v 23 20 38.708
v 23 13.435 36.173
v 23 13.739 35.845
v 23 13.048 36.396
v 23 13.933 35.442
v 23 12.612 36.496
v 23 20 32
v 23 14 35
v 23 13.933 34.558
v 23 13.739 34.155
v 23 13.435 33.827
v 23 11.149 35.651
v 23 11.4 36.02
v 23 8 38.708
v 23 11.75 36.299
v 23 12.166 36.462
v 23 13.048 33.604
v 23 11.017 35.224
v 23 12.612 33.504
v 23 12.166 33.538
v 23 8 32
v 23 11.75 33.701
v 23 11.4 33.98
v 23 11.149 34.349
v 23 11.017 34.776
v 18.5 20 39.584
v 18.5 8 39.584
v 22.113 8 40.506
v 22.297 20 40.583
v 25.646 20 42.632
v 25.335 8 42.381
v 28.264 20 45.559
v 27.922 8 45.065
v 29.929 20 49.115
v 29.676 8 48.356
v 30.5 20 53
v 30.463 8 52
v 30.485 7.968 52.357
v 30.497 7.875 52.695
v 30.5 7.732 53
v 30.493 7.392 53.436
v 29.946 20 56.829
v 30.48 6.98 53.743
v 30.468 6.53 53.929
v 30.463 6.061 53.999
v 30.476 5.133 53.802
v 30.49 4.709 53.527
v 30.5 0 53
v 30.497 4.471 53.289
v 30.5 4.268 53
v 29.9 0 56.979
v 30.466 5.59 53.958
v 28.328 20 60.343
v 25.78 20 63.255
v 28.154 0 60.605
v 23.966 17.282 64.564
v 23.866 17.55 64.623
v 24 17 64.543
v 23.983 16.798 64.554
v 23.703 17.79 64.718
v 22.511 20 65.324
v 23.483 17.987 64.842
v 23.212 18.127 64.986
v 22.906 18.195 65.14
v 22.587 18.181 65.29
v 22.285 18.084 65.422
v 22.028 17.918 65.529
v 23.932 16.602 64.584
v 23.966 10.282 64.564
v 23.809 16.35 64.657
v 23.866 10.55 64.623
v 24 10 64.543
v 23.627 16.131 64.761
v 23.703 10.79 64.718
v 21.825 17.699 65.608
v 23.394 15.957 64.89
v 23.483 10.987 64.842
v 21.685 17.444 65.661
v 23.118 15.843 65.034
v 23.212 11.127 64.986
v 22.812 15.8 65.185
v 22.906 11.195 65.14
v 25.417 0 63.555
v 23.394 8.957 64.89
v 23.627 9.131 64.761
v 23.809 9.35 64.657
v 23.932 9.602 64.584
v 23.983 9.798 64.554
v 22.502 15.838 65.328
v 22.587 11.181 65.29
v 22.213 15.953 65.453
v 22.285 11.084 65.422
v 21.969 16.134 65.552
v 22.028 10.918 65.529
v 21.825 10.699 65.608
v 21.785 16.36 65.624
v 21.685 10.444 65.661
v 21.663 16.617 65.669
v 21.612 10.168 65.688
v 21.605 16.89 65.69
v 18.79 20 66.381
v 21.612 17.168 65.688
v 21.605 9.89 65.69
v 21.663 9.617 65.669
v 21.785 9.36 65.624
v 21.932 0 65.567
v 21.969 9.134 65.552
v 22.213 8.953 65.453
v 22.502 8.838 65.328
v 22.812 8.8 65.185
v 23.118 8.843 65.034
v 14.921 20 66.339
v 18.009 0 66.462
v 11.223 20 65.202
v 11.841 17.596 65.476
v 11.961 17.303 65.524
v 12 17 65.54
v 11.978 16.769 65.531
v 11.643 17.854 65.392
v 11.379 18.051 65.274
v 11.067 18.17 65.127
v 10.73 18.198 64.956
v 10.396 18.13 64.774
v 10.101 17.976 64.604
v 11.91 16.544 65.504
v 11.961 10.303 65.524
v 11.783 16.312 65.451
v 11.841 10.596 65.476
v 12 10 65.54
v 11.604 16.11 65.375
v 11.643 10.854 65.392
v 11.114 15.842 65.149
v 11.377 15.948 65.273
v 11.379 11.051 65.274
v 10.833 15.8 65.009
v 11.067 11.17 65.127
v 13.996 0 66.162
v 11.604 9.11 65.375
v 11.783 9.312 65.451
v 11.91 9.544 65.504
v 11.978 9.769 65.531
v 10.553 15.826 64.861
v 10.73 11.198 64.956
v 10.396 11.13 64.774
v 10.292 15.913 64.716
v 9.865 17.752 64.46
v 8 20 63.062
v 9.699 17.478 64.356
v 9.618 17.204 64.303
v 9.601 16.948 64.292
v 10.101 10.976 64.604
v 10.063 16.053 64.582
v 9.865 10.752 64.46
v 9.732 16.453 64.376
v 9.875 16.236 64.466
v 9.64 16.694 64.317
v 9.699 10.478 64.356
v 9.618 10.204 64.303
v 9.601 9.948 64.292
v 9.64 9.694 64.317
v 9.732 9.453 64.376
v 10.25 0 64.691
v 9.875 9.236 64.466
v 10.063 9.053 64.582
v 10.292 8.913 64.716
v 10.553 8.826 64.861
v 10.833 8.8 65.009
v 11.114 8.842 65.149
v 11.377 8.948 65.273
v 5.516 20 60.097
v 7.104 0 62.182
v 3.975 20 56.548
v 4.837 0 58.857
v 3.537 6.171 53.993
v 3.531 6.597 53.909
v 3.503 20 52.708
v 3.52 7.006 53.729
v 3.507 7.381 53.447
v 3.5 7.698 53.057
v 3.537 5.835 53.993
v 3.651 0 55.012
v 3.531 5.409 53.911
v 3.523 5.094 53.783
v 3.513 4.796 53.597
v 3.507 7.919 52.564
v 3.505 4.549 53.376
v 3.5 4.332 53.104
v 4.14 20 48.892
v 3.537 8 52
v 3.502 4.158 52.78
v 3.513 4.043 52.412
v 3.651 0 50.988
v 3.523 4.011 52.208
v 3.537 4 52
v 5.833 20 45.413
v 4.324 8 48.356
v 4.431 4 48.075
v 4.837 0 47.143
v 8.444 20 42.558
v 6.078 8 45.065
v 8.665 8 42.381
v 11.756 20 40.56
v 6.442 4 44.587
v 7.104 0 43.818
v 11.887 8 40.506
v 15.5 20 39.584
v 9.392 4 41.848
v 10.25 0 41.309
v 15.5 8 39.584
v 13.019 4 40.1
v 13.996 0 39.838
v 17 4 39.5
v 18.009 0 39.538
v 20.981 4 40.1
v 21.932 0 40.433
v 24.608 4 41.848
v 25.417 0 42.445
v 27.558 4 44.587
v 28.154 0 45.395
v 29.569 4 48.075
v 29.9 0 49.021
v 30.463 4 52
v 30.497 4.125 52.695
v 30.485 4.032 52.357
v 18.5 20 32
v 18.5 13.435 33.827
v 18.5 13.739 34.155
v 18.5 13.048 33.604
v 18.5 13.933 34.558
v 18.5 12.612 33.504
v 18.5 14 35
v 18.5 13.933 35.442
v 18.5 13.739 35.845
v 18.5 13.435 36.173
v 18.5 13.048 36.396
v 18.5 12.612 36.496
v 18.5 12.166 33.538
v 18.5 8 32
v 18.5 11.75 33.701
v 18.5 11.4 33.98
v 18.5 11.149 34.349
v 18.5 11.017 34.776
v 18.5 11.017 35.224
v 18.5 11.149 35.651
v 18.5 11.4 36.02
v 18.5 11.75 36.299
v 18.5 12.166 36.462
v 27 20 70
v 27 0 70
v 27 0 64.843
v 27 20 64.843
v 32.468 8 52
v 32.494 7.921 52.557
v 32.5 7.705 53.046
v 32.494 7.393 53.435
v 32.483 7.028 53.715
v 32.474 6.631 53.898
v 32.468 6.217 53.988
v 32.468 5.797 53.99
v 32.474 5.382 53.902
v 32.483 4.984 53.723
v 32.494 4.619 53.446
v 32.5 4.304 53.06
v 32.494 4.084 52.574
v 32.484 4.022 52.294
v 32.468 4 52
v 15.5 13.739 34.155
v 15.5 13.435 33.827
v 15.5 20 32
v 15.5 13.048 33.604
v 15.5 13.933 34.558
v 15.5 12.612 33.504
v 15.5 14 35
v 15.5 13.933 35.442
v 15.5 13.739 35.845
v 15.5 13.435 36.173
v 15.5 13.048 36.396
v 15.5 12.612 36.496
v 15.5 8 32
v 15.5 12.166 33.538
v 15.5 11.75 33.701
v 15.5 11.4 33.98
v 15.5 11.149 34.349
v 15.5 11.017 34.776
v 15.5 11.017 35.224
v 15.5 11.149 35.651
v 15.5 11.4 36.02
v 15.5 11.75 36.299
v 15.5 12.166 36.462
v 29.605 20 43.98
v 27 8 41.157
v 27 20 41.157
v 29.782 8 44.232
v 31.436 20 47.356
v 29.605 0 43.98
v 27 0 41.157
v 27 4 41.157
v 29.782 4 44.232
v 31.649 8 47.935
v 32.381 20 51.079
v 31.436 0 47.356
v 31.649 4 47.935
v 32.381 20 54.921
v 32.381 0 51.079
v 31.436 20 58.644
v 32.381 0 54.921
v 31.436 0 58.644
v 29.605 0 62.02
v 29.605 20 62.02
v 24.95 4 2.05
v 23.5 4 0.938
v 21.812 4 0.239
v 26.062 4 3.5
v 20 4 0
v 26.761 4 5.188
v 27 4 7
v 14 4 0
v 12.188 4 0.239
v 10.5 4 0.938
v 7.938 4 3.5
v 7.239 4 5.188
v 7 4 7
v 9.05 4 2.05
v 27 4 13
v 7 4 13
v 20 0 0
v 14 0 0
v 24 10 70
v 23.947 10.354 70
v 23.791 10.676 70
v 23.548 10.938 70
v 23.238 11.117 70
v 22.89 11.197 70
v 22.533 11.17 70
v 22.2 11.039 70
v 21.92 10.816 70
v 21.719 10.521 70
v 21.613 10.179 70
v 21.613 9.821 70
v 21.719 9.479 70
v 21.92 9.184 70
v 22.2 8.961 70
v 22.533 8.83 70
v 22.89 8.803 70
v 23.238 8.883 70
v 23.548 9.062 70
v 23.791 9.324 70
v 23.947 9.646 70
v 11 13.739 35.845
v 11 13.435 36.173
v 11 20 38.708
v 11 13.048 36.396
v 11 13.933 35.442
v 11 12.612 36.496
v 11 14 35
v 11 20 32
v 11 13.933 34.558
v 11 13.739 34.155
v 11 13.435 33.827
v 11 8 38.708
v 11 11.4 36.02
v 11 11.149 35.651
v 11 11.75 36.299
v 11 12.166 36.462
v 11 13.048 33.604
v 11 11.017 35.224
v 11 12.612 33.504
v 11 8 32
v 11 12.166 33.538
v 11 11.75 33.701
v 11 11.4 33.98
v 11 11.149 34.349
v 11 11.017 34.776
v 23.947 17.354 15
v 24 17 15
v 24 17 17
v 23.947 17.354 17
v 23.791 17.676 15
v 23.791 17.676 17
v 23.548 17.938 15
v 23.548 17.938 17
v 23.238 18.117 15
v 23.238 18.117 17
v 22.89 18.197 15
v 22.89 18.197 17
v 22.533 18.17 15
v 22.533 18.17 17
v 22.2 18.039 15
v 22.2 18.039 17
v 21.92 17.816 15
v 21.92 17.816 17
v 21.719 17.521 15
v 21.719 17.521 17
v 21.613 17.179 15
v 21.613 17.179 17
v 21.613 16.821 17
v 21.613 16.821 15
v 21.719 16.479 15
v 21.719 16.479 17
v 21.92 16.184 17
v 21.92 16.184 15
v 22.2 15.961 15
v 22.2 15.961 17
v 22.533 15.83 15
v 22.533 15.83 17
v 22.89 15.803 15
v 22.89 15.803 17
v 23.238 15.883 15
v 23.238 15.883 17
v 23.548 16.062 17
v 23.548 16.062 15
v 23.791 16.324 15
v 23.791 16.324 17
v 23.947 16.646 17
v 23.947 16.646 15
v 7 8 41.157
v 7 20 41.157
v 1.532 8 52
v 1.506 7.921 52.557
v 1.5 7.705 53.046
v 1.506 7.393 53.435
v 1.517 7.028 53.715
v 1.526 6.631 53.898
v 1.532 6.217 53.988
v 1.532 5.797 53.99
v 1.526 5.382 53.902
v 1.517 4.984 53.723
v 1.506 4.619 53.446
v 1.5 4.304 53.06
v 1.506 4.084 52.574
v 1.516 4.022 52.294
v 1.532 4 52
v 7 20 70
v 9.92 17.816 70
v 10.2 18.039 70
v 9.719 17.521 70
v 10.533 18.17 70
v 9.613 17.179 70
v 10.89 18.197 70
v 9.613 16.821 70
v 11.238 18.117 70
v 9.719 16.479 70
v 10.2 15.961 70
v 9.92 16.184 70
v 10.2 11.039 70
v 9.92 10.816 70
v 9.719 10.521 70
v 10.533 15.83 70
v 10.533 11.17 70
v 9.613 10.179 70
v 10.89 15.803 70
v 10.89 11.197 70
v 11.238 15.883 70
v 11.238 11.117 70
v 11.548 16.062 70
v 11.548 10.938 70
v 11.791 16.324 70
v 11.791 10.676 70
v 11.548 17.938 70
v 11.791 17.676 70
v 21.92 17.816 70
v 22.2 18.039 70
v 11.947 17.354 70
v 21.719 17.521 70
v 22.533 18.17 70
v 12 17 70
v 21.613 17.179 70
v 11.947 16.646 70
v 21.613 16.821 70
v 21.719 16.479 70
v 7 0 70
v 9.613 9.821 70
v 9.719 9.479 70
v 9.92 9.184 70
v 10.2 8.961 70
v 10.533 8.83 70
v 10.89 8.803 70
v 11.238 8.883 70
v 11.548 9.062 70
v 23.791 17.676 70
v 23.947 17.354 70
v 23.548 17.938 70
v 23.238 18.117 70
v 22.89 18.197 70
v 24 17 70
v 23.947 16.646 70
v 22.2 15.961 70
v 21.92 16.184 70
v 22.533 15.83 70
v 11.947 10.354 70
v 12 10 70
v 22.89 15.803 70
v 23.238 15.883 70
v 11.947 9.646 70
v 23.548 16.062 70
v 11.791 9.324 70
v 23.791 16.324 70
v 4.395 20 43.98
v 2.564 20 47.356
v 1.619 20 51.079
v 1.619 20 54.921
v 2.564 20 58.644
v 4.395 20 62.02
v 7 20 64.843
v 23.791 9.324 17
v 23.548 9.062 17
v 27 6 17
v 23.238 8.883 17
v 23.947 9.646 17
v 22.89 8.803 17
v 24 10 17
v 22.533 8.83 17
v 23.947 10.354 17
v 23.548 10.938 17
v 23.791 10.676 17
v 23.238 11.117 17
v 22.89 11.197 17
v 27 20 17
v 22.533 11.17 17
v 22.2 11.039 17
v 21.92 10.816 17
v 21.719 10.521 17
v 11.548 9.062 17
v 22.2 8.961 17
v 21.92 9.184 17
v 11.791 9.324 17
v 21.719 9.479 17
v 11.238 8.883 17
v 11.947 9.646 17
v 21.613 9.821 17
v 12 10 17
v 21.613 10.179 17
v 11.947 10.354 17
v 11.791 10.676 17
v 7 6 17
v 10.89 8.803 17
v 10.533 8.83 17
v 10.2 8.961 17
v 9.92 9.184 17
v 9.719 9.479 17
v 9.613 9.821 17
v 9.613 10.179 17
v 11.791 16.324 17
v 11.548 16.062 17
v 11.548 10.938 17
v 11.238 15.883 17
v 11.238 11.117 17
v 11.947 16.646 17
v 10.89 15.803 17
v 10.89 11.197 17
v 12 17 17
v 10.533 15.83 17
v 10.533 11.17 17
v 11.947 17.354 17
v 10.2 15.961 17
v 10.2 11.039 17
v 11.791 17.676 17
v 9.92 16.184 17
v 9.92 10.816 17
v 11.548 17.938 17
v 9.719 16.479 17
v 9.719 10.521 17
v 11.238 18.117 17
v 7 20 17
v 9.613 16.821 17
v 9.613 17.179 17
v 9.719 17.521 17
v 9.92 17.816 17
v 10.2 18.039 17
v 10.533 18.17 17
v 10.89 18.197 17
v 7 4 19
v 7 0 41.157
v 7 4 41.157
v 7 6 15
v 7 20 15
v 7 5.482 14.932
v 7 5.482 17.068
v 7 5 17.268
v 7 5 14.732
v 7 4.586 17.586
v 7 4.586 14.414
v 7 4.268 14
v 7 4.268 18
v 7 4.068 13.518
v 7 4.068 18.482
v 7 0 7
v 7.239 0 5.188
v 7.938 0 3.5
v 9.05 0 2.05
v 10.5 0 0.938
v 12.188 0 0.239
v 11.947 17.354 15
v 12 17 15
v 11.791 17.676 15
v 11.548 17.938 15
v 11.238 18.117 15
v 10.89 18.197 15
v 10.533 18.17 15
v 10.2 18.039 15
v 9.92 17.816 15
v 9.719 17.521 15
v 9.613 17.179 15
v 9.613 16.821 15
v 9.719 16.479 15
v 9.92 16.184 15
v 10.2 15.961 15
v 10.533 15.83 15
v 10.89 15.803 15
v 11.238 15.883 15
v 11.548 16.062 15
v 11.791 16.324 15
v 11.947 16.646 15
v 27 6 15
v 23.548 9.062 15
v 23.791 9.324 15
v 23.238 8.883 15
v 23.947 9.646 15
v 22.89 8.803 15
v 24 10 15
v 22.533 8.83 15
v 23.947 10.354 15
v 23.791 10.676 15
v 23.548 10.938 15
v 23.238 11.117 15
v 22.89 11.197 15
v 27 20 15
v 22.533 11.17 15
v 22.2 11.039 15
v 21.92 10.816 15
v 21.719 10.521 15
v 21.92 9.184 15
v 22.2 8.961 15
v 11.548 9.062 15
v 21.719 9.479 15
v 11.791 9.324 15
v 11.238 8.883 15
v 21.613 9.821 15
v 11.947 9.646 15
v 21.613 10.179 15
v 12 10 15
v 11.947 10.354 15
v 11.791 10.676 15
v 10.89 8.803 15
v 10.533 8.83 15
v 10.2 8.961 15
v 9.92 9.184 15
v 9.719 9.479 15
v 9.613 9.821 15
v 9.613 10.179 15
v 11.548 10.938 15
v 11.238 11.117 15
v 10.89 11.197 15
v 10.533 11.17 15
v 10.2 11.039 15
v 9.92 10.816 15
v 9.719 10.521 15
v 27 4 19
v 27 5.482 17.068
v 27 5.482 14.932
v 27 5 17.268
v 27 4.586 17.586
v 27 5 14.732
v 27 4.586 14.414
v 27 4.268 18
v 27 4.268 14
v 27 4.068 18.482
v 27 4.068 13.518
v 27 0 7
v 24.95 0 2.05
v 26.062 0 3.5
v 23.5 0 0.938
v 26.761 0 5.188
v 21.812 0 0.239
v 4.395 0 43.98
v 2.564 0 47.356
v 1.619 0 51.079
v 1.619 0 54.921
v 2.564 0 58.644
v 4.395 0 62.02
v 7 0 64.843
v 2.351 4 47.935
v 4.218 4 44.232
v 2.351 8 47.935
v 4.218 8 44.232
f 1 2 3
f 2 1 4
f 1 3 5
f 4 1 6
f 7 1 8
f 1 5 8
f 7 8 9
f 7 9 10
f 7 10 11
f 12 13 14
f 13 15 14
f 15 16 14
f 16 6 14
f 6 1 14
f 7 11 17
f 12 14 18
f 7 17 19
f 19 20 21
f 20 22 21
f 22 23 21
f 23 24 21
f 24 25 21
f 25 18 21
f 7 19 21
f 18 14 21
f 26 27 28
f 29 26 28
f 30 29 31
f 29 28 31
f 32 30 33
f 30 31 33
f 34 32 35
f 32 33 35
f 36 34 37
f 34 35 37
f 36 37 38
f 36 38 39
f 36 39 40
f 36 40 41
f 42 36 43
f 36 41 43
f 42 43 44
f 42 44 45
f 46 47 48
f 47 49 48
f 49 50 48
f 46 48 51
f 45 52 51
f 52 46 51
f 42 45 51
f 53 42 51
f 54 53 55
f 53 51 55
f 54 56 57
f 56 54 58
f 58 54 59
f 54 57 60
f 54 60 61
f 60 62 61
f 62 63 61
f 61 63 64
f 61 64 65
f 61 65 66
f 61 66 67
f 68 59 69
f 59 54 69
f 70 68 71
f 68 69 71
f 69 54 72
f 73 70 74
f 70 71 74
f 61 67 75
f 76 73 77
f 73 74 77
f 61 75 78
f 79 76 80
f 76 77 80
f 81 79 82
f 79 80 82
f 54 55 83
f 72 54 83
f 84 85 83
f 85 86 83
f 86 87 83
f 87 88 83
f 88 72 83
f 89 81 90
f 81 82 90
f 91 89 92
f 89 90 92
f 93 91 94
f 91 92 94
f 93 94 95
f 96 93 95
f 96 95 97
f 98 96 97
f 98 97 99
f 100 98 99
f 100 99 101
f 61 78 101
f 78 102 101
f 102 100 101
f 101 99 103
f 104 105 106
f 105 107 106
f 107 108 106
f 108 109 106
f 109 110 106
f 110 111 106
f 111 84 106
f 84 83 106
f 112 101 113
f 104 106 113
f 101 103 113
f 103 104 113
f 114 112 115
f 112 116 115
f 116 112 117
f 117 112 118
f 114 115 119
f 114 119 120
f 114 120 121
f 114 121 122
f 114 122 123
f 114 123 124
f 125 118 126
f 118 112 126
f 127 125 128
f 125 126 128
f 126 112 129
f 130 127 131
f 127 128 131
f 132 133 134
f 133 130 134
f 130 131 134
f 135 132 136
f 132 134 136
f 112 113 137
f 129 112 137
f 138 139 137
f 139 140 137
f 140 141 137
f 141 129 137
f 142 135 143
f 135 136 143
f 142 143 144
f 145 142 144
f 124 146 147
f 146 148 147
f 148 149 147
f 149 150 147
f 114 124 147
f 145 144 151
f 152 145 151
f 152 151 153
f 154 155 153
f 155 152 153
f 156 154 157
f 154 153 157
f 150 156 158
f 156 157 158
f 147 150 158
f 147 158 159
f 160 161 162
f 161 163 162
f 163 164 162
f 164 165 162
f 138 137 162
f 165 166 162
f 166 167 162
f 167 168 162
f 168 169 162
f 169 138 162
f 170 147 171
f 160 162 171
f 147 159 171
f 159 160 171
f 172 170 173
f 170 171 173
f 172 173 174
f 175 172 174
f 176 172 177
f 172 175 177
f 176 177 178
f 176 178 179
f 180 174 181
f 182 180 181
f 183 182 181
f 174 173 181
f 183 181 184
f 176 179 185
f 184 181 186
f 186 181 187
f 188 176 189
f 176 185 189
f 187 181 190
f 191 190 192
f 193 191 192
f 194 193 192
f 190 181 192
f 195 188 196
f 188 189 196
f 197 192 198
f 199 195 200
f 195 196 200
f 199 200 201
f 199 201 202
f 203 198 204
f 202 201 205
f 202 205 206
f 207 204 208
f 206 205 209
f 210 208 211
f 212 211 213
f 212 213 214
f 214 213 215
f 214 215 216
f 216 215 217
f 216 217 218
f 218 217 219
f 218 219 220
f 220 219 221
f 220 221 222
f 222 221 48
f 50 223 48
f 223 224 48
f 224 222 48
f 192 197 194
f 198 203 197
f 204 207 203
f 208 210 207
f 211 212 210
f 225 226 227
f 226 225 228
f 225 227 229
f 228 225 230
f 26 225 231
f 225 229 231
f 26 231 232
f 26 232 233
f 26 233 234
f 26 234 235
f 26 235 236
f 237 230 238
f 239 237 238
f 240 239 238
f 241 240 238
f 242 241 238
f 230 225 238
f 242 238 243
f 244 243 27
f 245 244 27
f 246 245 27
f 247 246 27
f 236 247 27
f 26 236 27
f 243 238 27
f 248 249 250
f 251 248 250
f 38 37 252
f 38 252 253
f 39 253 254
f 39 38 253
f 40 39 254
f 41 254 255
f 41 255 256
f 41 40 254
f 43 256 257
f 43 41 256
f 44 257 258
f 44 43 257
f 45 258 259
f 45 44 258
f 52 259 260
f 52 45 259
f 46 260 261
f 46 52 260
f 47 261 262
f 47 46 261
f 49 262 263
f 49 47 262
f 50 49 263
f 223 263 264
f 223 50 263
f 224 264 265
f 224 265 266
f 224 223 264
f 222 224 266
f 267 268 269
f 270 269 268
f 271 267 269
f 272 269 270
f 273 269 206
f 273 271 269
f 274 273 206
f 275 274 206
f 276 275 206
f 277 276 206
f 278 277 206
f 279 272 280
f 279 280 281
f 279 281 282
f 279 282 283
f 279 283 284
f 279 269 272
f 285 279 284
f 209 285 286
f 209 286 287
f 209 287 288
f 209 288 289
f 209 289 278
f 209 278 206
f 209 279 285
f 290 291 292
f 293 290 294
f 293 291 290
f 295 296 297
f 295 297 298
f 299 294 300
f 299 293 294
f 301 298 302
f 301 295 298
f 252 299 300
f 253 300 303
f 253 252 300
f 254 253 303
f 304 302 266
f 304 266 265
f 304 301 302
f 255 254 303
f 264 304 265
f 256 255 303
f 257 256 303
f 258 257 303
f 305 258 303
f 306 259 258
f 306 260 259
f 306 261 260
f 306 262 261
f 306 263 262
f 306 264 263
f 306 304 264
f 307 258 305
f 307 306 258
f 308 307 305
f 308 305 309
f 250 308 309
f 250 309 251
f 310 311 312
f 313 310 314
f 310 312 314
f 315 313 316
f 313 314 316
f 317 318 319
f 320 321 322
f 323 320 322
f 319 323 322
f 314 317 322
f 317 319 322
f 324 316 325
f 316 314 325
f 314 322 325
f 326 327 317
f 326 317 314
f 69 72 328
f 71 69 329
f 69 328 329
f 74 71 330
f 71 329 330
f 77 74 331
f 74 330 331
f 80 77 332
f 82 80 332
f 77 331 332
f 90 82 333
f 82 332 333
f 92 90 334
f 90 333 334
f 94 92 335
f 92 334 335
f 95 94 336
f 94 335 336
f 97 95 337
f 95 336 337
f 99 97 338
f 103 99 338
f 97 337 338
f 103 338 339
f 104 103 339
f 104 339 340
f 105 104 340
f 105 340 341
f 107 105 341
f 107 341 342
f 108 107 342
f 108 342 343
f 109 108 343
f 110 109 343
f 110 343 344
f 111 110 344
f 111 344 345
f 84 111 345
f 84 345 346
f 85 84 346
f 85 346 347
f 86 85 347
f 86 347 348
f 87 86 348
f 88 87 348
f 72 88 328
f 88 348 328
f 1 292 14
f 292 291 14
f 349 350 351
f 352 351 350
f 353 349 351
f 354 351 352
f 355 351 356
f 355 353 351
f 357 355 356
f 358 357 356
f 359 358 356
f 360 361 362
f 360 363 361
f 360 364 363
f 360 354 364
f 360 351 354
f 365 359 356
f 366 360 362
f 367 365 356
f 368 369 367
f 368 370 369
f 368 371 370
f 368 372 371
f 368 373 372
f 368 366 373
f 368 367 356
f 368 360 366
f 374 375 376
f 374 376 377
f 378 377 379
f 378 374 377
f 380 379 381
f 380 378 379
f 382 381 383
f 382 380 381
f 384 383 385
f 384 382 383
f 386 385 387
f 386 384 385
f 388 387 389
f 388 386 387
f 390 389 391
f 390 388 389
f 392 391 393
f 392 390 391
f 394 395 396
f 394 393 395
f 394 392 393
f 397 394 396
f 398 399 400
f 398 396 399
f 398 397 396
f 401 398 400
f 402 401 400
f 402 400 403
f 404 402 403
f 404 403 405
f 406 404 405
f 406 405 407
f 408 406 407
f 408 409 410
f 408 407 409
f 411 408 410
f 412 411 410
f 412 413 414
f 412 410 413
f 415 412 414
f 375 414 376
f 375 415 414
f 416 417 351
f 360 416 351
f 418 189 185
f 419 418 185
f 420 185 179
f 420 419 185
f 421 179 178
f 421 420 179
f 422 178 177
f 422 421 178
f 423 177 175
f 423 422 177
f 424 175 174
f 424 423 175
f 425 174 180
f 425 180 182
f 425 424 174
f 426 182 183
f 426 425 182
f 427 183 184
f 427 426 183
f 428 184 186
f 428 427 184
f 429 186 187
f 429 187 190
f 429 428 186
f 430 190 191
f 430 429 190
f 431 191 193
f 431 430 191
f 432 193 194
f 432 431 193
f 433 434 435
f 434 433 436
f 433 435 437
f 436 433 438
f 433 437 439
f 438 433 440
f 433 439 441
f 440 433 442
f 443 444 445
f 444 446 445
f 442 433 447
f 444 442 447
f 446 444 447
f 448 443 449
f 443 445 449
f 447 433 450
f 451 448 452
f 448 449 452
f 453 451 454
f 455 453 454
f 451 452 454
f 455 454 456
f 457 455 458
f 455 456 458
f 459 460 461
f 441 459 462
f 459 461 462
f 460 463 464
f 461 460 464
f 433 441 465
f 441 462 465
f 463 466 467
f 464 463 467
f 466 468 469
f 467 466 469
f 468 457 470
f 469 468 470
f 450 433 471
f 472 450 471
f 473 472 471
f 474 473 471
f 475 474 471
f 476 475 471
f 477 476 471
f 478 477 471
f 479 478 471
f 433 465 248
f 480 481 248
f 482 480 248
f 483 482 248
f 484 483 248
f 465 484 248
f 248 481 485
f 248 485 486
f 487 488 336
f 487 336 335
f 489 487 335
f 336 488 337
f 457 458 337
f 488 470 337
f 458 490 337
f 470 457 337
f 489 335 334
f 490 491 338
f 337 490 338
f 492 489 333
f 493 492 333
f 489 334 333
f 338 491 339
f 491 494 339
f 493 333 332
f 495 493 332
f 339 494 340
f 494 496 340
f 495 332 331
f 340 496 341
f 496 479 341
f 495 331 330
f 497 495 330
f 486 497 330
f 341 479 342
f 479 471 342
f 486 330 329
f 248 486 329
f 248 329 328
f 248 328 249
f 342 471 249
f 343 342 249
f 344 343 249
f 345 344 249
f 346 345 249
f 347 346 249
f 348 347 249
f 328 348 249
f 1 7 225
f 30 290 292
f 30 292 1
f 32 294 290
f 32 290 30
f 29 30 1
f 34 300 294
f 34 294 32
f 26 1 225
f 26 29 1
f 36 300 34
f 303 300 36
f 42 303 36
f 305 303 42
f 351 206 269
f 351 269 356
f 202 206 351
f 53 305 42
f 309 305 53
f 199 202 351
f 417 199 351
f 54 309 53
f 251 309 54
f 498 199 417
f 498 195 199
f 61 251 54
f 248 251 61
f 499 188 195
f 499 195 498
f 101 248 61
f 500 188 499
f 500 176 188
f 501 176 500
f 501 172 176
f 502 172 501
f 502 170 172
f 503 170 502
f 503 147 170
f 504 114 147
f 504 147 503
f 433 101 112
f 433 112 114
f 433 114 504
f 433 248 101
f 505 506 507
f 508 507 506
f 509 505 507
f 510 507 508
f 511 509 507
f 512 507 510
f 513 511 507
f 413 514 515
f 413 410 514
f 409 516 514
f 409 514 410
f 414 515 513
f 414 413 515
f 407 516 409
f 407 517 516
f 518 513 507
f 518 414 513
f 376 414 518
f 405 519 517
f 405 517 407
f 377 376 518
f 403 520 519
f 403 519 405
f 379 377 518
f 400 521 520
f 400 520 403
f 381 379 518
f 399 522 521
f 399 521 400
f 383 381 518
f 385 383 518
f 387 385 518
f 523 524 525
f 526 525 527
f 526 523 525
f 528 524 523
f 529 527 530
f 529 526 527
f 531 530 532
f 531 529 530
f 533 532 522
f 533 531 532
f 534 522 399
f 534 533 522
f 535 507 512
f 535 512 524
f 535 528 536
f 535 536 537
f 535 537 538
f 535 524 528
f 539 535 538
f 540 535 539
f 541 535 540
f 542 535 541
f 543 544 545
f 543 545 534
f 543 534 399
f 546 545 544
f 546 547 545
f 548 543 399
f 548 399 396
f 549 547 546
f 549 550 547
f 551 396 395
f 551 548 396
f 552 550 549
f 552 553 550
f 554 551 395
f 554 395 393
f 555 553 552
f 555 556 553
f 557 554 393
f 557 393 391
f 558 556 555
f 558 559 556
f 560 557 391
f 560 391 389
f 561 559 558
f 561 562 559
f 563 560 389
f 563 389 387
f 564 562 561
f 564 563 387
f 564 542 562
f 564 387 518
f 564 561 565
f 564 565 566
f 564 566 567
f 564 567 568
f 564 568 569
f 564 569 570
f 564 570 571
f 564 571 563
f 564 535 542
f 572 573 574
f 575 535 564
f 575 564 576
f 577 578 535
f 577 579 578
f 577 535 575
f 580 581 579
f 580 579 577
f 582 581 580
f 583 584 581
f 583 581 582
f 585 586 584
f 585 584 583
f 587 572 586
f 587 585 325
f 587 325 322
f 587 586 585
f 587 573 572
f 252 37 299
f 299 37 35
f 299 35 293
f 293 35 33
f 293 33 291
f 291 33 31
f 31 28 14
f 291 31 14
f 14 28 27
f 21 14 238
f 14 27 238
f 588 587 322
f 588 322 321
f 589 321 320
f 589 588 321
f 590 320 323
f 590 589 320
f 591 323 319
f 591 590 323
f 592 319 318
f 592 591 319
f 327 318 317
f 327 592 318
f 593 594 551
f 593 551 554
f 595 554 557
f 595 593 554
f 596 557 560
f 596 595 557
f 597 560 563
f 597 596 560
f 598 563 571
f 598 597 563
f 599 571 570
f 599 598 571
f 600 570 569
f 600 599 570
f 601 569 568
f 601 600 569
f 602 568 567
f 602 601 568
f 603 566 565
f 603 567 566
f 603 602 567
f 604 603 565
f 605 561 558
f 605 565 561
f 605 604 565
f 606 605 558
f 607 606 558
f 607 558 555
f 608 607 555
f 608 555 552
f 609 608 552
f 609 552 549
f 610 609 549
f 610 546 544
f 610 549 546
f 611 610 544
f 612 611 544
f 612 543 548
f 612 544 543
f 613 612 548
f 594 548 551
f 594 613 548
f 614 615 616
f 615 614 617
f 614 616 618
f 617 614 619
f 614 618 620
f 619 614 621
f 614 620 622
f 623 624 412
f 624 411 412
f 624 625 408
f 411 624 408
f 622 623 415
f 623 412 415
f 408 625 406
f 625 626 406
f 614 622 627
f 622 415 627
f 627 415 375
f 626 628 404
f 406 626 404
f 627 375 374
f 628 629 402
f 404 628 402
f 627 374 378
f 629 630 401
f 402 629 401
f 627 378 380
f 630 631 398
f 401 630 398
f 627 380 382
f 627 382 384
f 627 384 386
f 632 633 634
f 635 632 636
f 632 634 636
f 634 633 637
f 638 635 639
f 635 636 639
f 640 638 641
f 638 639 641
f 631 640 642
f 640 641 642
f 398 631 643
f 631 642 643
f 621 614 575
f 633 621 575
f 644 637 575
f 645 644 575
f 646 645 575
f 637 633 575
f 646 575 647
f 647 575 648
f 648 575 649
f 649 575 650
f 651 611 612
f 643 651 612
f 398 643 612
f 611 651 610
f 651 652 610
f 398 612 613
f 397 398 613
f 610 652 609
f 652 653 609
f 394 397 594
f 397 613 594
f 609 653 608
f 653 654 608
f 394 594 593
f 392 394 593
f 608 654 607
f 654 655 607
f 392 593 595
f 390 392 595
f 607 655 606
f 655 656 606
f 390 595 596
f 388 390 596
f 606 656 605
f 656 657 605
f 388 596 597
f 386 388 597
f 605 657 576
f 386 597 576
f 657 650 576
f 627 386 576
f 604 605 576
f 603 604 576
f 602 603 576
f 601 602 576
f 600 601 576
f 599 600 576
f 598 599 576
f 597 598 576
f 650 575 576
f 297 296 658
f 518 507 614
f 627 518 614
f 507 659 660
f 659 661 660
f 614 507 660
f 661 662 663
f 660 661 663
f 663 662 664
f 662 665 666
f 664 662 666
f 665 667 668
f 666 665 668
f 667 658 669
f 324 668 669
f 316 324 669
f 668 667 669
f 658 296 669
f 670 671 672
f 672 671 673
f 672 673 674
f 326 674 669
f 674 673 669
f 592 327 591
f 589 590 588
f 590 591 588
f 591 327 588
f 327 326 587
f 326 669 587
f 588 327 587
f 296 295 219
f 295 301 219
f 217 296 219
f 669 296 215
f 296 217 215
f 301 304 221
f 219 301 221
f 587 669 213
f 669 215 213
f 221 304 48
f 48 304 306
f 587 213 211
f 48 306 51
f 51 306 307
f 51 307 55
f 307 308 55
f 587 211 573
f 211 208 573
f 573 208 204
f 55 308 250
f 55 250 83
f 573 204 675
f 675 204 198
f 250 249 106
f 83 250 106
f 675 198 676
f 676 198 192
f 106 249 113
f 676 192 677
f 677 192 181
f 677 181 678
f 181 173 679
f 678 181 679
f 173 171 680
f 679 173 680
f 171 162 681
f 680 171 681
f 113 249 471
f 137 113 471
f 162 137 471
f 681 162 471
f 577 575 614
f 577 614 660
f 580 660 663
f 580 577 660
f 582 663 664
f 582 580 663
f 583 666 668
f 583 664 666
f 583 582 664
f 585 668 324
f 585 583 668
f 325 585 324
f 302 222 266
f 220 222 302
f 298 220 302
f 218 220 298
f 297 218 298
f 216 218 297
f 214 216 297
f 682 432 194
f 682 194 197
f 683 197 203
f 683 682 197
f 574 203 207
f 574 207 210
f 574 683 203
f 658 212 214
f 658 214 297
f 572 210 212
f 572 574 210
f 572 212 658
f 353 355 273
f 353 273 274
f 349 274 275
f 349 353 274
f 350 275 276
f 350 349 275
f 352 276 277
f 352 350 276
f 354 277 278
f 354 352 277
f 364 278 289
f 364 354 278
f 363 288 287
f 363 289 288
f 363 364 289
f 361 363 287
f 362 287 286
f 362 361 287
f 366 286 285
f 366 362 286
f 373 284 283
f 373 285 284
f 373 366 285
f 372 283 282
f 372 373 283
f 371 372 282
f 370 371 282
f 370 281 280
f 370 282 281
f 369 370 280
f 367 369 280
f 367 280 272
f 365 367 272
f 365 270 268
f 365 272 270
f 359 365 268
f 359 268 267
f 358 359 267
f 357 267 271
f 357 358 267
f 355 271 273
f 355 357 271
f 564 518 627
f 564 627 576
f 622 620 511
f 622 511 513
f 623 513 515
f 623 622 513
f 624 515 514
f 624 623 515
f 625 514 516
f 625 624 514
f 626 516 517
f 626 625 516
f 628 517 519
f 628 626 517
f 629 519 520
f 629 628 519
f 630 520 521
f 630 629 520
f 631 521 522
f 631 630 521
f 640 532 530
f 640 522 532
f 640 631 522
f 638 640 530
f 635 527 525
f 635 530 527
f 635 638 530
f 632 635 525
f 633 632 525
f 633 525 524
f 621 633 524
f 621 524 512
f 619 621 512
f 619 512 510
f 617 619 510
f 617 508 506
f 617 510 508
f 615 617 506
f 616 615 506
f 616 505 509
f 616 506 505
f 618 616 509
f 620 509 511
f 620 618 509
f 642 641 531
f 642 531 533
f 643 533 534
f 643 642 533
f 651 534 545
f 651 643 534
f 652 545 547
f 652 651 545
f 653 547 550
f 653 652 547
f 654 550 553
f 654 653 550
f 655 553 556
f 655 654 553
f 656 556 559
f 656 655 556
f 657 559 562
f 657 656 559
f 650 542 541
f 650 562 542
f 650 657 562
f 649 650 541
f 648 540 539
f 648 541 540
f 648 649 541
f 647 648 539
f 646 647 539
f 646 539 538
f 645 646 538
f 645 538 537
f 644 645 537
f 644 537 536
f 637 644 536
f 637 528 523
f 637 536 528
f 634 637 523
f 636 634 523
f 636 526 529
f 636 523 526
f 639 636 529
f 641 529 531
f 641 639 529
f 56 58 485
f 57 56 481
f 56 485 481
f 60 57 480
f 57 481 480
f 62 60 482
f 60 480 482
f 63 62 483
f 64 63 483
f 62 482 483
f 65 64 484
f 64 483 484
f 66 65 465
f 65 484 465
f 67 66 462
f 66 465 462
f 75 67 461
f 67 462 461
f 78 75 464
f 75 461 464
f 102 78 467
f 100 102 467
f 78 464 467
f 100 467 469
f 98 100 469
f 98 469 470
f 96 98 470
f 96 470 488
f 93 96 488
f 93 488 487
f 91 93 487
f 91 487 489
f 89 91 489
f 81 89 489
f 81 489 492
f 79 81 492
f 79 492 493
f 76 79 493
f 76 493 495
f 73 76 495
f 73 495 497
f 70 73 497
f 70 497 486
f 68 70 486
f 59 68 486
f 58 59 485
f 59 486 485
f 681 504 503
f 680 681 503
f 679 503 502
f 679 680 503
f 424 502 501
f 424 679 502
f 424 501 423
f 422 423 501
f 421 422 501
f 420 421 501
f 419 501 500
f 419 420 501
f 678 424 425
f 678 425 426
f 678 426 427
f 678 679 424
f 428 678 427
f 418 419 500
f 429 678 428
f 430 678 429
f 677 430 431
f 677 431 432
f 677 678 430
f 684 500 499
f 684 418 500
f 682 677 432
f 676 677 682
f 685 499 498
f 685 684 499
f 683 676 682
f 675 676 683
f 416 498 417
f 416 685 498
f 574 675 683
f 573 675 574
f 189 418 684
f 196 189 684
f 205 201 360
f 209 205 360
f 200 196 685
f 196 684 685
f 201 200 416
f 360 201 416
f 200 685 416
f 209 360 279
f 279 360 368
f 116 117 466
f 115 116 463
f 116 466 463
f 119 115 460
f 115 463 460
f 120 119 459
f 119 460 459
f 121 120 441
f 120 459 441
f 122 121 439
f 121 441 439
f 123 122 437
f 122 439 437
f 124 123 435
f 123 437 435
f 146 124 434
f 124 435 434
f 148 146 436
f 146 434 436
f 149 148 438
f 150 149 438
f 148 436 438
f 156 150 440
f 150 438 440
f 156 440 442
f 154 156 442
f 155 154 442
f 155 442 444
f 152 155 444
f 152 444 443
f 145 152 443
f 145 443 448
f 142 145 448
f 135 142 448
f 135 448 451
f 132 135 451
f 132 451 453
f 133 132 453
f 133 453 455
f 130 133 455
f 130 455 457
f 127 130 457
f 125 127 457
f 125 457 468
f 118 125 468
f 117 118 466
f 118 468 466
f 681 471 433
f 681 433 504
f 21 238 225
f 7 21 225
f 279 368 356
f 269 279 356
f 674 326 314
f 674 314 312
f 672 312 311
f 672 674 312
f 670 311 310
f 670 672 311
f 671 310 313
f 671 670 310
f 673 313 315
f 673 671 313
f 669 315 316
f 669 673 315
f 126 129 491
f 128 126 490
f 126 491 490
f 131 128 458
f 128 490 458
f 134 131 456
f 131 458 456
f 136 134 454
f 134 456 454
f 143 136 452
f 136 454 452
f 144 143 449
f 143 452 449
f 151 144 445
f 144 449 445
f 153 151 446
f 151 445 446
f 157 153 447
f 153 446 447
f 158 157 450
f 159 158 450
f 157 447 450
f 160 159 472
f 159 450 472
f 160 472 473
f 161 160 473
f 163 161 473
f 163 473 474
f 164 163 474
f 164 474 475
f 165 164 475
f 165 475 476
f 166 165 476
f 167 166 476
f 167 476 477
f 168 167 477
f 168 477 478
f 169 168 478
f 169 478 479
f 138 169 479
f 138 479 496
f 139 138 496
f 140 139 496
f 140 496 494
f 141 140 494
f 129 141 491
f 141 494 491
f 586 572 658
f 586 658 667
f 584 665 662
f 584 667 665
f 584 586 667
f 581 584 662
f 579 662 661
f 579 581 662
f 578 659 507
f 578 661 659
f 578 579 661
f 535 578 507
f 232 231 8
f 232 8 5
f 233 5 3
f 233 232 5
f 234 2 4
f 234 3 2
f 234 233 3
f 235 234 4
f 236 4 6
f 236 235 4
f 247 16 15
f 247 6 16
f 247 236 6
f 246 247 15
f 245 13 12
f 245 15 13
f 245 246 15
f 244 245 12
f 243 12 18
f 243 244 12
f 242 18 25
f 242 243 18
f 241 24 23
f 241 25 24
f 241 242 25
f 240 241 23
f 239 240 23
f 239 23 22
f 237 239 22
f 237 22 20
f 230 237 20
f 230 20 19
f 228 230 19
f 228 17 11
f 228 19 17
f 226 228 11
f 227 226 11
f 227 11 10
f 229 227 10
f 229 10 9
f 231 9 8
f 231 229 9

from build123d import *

# Parameters (mm, degrees)
SKETCH003_R                          = 1.2
EXTRUDE003_DEPTH                     = 6
EXTRUDE004_DEPTH                     = 5
SKETCH002_AS_DRAWN_W                 = 3
SKETCH002_AS_DRAWN_H                 = 17.571103
EXTRUDE002_DEPTH                     = 15
EXTRUDE002_ONTO_SKETCH002_ROLL_ANGLE = 90
SKETCH_R                             = 1.5
EXTRUDE_DEPTH                        = 36
SKETCH001_AS_DRAWN_R                 = 13.5
EXTRUDE001_DEPTH                     = 20
EXTRUDE001_ONTO_SKETCH001_ROLL_ANGLE = 90


with BuildPart() as mounting_holes_top:
    # Sketch003 → Extrude003 (new body)
    with BuildSketch(Plane.XY.offset(70)):
        with Locations((10.8, 17)):
            Circle(SKETCH003_R)
        with Locations((22.8, 17)):
            Circle(SKETCH003_R)
        with Locations((10.8, 10)):
            Circle(SKETCH003_R)
        with Locations((22.8, 10)):
            Circle(SKETCH003_R)
    extrude(amount=-EXTRUDE003_DEPTH)


with BuildPart() as fusion:
    # Sketch003 → Extrude004 (new body)
    with BuildSketch(Plane.XY.offset(70)):
        with Locations((10.8, 17)):
            Circle(SKETCH003_R)
        with Locations((22.8, 17)):
            Circle(SKETCH003_R)
        with Locations((10.8, 10)):
            Circle(SKETCH003_R)
        with Locations((22.8, 10)):
            Circle(SKETCH003_R)
    extrude(amount=EXTRUDE004_DEPTH)


with BuildPart() as fusion_1:
    # Extrude004 placement: moved
    add(fusion.part.moved(Location((0, 0, -57))))

    # Fusion: union Mounting_Holes_Top
    add(mounting_holes_top.part)


with BuildPart() as extrude002:
    # Sketch002 as drawn → Extrude002 (new)
    with BuildSketch(Plane.XY):
        with Locations((0, 38.493945)):
            Rectangle(SKETCH002_AS_DRAWN_W, SKETCH002_AS_DRAWN_H)
        Polygon((6, 38.708394), (6, 29.708394), (20, 29.708394), (20, 47.279497), align=None)
        Polygon((-6, 38.708394), (-6, 29.708394), (-20, 29.708394), (-20, 47.279497), align=None)
    extrude(amount=-EXTRUDE002_DEPTH)


with BuildPart() as extrude002_1:
    # Extrude002 onto Sketch002 roll: moved
    add(extrude002.part.rotate(Axis((0, 0, 0), (1, 0, 0)), EXTRUDE002_ONTO_SKETCH002_ROLL_ANGLE))


with BuildPart() as extrude002_2:
    # Extrude002 onto Sketch002 placement: moved
    add(extrude002_1.part.moved(Location((17, 0, 0))))


with BuildPart() as extrude002_3:
    # Extrude002 placement: moved
    add(extrude002_2.part.moved(Location((0, 5, 0))))


with BuildPart() as extrude_body:
    # Sketch → Extrude (new body)
    with BuildSketch(Plane.YZ):
        with Locations((12.5, 35)):
            Circle(SKETCH_R)
        with BuildLine():
            Line((4, 52), (4, 19))
            ThreePointArc((4, 19), (4.585786, 17.585786), (6, 17))
            Line((6, 17), (45, 17))
            Line((45, 17), (45, 32))
            Line((8, 32), (45, 32))
            Line((8, 52), (8, 32))
            ThreePointArc((8, 52), (6, 54), (4, 52))
        make_face()
        with BuildLine():
            Line((6, 15), (45, 15))
            Line((45, 15), (45, -5))
            Line((45, -5), (6, -5))
            ThreePointArc((4, -3), (4.585786, -4.414214), (6, -5))
            Line((4, -3), (4, 13))
            ThreePointArc((6, 15), (4.585786, 14.414214), (4, 13))
        make_face()
    extrude(amount=EXTRUDE_DEPTH)


with BuildPart() as extrude_body_1:
    # Extrude placement: moved
    add(extrude_body.part.moved(Location((-1, 0, 0))))


with BuildPart() as cut002:
    # Sketch001 as drawn → Extrude001 (new)
    with BuildSketch(Plane.XY):
        with BuildLine():
            Line((-10, 70), (10, 70))
            Line((10, 70), (10, 64.842719))
            ThreePointArc((10, 41.157281), (15.5, 53), (10, 64.842719))
            Line((10, 41.157281), (10, 7))
            ThreePointArc((3, 0), (7.949747, 2.050253), (10, 7))
            Line((-3, 0), (3, 0))
            ThreePointArc((-10, 7), (-7.949747, 2.050253), (-3, 0))
            Line((-10, 41.157281), (-10, 7))
            ThreePointArc((-10, 64.842719), (-15.5, 53), (-10, 41.157281))
            Line((-10, 70), (-10, 64.842719))
        make_face()
        with Locations((0, 53)):
            Circle(SKETCH001_AS_DRAWN_R, mode=Mode.SUBTRACT)
    extrude(amount=-EXTRUDE001_DEPTH)


with BuildPart() as cut002_1:
    # Extrude001 onto Sketch001 roll: moved
    add(cut002.part.rotate(Axis((0, 0, 0), (1, 0, 0)), EXTRUDE001_ONTO_SKETCH001_ROLL_ANGLE))


with BuildPart() as cut002_2:
    # Extrude001 onto Sketch001 placement: moved
    add(cut002_1.part.moved(Location((17, 0, 0))))

    # Cut: cut Extrude body
    add(extrude_body_1.part, mode=Mode.SUBTRACT)

    # Cut001: cut Extrude002
    add(extrude002_3.part, mode=Mode.SUBTRACT)

    # Cut002: cut Fusion
    add(fusion_1.part, mode=Mode.SUBTRACT)


solid = cut002_2.part
